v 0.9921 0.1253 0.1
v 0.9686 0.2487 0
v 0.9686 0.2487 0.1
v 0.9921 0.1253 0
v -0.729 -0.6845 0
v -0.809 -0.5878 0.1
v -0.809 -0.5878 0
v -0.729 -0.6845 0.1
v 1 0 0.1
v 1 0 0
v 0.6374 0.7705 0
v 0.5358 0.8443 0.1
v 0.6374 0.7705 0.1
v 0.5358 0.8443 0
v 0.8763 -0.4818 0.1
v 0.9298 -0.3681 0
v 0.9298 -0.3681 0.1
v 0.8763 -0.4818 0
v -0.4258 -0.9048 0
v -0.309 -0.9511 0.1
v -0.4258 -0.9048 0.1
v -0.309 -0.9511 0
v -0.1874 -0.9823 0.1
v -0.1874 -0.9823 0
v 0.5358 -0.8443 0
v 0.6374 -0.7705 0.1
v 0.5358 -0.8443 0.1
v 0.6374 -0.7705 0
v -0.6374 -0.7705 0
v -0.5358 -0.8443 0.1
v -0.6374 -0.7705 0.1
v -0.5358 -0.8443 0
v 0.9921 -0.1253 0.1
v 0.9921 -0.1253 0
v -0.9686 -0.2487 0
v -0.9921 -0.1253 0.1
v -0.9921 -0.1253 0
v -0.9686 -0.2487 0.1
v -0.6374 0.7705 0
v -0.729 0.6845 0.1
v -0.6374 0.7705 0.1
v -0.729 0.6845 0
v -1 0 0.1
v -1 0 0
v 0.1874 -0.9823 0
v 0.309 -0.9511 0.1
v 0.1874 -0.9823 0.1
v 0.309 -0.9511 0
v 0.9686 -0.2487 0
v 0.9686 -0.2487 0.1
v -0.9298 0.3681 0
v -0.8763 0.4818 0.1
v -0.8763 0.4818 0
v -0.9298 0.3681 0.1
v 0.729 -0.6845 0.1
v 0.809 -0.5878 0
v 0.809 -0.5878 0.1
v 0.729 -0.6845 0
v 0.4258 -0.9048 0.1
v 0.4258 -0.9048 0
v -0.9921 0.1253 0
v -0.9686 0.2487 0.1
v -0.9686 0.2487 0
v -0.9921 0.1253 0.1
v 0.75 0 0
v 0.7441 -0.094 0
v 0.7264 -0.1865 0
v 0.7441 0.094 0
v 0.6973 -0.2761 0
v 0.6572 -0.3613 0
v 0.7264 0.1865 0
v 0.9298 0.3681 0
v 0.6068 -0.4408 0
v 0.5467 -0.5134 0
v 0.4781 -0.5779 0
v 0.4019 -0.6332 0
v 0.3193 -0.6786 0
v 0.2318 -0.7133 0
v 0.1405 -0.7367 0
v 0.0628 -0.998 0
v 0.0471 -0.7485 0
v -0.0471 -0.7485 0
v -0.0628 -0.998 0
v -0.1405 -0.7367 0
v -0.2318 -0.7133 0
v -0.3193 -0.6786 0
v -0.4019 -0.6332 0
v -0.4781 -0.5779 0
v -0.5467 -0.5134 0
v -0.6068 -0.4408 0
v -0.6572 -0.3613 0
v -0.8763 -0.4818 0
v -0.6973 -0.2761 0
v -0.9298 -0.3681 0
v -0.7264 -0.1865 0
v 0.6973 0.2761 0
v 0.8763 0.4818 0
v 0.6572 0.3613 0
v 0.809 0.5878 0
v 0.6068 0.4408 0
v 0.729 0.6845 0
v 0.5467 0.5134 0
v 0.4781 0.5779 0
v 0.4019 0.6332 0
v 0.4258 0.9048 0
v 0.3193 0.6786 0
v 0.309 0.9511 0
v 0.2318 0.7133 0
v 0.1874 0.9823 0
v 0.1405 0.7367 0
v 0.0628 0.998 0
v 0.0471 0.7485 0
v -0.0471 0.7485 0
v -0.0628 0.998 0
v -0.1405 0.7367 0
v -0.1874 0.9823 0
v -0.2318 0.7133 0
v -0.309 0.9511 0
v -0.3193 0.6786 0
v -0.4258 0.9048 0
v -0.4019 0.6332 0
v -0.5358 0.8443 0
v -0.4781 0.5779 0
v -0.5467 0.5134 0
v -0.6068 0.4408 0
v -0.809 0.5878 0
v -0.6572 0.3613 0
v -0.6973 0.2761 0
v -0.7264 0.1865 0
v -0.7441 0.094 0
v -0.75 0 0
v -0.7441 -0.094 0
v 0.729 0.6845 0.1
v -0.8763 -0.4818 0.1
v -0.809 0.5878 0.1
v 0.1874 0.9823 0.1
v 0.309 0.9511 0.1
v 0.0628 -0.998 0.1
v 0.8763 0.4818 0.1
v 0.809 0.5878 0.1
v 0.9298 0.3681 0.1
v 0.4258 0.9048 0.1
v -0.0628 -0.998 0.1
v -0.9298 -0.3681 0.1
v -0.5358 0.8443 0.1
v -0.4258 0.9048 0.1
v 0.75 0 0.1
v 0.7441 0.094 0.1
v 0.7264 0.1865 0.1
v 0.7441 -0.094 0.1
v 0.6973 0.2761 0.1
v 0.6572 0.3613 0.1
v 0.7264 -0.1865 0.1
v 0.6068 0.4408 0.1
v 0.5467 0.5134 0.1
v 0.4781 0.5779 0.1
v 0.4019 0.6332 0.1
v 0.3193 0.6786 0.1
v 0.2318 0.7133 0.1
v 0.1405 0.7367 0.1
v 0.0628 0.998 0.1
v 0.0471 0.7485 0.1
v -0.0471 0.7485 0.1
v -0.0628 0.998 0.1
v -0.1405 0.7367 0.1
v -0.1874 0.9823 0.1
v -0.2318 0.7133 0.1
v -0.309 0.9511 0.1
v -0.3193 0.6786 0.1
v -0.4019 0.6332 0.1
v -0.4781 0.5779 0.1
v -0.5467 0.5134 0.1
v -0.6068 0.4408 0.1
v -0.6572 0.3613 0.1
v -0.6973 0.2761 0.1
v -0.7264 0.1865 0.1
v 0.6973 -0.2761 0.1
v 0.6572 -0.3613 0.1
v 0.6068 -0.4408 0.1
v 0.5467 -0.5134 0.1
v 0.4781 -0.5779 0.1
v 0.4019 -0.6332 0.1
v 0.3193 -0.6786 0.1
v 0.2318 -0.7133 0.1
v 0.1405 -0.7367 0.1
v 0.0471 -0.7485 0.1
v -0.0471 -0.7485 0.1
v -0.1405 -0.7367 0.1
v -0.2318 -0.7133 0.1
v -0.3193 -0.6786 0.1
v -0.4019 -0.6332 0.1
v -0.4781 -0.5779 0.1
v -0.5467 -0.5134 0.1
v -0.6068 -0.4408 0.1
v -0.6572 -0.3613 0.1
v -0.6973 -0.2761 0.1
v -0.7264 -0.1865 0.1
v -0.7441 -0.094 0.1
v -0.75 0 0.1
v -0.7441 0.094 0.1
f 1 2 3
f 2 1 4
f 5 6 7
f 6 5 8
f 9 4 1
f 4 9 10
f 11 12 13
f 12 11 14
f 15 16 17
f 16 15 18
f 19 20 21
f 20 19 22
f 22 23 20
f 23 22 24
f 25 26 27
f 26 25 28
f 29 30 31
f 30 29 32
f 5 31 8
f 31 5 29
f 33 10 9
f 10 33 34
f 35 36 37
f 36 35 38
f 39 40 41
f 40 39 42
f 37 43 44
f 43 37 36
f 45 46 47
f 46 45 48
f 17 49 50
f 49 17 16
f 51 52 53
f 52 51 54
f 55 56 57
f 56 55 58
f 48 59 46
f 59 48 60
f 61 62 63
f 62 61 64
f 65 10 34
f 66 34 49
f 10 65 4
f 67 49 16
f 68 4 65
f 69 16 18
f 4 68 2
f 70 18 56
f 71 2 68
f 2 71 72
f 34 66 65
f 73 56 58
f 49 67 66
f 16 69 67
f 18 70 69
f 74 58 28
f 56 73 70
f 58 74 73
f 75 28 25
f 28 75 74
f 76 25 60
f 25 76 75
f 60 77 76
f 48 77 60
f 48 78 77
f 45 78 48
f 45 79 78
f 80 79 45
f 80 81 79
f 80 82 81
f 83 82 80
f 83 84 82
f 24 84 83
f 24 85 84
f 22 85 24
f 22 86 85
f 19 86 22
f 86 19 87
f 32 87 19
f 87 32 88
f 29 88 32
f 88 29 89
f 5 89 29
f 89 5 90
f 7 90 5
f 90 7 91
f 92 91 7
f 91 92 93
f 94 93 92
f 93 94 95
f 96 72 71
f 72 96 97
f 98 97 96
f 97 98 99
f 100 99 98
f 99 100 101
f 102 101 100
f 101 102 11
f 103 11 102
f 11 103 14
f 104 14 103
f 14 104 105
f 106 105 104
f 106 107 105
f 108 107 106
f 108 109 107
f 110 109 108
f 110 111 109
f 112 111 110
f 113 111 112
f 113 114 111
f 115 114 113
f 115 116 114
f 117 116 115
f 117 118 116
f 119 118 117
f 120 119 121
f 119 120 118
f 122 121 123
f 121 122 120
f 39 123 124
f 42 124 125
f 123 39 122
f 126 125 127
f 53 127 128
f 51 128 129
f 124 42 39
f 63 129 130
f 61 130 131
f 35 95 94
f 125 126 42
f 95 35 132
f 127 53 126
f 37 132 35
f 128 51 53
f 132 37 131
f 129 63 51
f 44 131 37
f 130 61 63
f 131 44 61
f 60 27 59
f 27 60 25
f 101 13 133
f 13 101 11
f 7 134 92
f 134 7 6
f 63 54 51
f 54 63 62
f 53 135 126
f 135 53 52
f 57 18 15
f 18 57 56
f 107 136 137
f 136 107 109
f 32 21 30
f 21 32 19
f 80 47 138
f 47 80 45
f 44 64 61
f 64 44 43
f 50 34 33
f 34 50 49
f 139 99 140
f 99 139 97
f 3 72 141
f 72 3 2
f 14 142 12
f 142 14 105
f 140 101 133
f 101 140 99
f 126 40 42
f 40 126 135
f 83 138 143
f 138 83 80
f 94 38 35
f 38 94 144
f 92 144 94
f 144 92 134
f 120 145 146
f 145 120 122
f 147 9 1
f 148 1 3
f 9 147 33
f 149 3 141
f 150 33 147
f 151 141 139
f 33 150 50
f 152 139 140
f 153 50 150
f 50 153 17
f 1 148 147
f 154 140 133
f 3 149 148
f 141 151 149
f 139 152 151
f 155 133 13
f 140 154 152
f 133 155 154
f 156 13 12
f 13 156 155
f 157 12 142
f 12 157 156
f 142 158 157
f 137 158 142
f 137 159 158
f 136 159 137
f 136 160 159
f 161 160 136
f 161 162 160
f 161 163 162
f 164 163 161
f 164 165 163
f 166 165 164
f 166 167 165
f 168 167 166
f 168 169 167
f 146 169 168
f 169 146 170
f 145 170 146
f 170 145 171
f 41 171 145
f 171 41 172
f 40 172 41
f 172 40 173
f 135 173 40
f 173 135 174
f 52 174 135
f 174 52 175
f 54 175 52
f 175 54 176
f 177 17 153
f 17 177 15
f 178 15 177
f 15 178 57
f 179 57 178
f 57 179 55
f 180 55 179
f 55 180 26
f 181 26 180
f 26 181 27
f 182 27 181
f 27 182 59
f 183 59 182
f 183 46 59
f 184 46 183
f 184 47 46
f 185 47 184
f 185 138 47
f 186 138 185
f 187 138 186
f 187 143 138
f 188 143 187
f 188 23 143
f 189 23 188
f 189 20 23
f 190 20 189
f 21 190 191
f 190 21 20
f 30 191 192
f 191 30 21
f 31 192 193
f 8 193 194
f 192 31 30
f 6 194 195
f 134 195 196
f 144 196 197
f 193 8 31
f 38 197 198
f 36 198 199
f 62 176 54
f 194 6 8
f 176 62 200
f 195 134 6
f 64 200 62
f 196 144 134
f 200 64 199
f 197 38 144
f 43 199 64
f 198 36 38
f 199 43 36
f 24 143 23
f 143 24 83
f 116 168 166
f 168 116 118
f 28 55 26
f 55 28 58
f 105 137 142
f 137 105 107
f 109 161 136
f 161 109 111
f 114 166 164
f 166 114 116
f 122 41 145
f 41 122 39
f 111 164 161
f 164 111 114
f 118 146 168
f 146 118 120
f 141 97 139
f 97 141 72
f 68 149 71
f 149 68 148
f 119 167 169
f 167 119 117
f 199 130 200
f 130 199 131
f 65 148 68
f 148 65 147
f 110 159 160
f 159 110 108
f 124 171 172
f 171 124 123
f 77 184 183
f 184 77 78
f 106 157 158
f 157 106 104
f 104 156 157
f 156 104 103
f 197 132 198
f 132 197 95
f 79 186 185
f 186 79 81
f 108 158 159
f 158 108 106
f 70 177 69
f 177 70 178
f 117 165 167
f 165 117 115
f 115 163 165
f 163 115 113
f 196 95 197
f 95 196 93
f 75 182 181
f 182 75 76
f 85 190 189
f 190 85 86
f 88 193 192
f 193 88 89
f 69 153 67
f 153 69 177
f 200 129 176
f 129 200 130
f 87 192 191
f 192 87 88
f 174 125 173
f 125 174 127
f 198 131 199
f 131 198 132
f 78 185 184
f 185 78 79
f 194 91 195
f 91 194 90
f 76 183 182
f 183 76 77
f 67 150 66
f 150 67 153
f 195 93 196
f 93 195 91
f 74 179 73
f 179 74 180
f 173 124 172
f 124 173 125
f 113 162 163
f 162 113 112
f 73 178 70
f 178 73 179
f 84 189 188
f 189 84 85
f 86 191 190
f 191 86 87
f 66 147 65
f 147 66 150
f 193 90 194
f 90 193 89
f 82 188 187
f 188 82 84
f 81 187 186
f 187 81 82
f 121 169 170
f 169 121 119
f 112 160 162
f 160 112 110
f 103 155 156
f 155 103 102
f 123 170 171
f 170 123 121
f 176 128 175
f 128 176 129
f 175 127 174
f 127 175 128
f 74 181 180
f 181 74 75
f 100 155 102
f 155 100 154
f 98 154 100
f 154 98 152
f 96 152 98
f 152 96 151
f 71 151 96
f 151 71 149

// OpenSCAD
// An annulus.
// License: MIT
// Copyright (c) 2026 Heiner Schmidt

module annulus(R, r, w)
{
    difference()
    {    
        linear_extrude(height = w)
        circle(r = R);
        
        translate([0,0,-0.5])
        {
            linear_extrude(height = w+1)
            circle(r = r);
        }
    }
}
annulus(1, 0.75, .1, $fn = 50);
